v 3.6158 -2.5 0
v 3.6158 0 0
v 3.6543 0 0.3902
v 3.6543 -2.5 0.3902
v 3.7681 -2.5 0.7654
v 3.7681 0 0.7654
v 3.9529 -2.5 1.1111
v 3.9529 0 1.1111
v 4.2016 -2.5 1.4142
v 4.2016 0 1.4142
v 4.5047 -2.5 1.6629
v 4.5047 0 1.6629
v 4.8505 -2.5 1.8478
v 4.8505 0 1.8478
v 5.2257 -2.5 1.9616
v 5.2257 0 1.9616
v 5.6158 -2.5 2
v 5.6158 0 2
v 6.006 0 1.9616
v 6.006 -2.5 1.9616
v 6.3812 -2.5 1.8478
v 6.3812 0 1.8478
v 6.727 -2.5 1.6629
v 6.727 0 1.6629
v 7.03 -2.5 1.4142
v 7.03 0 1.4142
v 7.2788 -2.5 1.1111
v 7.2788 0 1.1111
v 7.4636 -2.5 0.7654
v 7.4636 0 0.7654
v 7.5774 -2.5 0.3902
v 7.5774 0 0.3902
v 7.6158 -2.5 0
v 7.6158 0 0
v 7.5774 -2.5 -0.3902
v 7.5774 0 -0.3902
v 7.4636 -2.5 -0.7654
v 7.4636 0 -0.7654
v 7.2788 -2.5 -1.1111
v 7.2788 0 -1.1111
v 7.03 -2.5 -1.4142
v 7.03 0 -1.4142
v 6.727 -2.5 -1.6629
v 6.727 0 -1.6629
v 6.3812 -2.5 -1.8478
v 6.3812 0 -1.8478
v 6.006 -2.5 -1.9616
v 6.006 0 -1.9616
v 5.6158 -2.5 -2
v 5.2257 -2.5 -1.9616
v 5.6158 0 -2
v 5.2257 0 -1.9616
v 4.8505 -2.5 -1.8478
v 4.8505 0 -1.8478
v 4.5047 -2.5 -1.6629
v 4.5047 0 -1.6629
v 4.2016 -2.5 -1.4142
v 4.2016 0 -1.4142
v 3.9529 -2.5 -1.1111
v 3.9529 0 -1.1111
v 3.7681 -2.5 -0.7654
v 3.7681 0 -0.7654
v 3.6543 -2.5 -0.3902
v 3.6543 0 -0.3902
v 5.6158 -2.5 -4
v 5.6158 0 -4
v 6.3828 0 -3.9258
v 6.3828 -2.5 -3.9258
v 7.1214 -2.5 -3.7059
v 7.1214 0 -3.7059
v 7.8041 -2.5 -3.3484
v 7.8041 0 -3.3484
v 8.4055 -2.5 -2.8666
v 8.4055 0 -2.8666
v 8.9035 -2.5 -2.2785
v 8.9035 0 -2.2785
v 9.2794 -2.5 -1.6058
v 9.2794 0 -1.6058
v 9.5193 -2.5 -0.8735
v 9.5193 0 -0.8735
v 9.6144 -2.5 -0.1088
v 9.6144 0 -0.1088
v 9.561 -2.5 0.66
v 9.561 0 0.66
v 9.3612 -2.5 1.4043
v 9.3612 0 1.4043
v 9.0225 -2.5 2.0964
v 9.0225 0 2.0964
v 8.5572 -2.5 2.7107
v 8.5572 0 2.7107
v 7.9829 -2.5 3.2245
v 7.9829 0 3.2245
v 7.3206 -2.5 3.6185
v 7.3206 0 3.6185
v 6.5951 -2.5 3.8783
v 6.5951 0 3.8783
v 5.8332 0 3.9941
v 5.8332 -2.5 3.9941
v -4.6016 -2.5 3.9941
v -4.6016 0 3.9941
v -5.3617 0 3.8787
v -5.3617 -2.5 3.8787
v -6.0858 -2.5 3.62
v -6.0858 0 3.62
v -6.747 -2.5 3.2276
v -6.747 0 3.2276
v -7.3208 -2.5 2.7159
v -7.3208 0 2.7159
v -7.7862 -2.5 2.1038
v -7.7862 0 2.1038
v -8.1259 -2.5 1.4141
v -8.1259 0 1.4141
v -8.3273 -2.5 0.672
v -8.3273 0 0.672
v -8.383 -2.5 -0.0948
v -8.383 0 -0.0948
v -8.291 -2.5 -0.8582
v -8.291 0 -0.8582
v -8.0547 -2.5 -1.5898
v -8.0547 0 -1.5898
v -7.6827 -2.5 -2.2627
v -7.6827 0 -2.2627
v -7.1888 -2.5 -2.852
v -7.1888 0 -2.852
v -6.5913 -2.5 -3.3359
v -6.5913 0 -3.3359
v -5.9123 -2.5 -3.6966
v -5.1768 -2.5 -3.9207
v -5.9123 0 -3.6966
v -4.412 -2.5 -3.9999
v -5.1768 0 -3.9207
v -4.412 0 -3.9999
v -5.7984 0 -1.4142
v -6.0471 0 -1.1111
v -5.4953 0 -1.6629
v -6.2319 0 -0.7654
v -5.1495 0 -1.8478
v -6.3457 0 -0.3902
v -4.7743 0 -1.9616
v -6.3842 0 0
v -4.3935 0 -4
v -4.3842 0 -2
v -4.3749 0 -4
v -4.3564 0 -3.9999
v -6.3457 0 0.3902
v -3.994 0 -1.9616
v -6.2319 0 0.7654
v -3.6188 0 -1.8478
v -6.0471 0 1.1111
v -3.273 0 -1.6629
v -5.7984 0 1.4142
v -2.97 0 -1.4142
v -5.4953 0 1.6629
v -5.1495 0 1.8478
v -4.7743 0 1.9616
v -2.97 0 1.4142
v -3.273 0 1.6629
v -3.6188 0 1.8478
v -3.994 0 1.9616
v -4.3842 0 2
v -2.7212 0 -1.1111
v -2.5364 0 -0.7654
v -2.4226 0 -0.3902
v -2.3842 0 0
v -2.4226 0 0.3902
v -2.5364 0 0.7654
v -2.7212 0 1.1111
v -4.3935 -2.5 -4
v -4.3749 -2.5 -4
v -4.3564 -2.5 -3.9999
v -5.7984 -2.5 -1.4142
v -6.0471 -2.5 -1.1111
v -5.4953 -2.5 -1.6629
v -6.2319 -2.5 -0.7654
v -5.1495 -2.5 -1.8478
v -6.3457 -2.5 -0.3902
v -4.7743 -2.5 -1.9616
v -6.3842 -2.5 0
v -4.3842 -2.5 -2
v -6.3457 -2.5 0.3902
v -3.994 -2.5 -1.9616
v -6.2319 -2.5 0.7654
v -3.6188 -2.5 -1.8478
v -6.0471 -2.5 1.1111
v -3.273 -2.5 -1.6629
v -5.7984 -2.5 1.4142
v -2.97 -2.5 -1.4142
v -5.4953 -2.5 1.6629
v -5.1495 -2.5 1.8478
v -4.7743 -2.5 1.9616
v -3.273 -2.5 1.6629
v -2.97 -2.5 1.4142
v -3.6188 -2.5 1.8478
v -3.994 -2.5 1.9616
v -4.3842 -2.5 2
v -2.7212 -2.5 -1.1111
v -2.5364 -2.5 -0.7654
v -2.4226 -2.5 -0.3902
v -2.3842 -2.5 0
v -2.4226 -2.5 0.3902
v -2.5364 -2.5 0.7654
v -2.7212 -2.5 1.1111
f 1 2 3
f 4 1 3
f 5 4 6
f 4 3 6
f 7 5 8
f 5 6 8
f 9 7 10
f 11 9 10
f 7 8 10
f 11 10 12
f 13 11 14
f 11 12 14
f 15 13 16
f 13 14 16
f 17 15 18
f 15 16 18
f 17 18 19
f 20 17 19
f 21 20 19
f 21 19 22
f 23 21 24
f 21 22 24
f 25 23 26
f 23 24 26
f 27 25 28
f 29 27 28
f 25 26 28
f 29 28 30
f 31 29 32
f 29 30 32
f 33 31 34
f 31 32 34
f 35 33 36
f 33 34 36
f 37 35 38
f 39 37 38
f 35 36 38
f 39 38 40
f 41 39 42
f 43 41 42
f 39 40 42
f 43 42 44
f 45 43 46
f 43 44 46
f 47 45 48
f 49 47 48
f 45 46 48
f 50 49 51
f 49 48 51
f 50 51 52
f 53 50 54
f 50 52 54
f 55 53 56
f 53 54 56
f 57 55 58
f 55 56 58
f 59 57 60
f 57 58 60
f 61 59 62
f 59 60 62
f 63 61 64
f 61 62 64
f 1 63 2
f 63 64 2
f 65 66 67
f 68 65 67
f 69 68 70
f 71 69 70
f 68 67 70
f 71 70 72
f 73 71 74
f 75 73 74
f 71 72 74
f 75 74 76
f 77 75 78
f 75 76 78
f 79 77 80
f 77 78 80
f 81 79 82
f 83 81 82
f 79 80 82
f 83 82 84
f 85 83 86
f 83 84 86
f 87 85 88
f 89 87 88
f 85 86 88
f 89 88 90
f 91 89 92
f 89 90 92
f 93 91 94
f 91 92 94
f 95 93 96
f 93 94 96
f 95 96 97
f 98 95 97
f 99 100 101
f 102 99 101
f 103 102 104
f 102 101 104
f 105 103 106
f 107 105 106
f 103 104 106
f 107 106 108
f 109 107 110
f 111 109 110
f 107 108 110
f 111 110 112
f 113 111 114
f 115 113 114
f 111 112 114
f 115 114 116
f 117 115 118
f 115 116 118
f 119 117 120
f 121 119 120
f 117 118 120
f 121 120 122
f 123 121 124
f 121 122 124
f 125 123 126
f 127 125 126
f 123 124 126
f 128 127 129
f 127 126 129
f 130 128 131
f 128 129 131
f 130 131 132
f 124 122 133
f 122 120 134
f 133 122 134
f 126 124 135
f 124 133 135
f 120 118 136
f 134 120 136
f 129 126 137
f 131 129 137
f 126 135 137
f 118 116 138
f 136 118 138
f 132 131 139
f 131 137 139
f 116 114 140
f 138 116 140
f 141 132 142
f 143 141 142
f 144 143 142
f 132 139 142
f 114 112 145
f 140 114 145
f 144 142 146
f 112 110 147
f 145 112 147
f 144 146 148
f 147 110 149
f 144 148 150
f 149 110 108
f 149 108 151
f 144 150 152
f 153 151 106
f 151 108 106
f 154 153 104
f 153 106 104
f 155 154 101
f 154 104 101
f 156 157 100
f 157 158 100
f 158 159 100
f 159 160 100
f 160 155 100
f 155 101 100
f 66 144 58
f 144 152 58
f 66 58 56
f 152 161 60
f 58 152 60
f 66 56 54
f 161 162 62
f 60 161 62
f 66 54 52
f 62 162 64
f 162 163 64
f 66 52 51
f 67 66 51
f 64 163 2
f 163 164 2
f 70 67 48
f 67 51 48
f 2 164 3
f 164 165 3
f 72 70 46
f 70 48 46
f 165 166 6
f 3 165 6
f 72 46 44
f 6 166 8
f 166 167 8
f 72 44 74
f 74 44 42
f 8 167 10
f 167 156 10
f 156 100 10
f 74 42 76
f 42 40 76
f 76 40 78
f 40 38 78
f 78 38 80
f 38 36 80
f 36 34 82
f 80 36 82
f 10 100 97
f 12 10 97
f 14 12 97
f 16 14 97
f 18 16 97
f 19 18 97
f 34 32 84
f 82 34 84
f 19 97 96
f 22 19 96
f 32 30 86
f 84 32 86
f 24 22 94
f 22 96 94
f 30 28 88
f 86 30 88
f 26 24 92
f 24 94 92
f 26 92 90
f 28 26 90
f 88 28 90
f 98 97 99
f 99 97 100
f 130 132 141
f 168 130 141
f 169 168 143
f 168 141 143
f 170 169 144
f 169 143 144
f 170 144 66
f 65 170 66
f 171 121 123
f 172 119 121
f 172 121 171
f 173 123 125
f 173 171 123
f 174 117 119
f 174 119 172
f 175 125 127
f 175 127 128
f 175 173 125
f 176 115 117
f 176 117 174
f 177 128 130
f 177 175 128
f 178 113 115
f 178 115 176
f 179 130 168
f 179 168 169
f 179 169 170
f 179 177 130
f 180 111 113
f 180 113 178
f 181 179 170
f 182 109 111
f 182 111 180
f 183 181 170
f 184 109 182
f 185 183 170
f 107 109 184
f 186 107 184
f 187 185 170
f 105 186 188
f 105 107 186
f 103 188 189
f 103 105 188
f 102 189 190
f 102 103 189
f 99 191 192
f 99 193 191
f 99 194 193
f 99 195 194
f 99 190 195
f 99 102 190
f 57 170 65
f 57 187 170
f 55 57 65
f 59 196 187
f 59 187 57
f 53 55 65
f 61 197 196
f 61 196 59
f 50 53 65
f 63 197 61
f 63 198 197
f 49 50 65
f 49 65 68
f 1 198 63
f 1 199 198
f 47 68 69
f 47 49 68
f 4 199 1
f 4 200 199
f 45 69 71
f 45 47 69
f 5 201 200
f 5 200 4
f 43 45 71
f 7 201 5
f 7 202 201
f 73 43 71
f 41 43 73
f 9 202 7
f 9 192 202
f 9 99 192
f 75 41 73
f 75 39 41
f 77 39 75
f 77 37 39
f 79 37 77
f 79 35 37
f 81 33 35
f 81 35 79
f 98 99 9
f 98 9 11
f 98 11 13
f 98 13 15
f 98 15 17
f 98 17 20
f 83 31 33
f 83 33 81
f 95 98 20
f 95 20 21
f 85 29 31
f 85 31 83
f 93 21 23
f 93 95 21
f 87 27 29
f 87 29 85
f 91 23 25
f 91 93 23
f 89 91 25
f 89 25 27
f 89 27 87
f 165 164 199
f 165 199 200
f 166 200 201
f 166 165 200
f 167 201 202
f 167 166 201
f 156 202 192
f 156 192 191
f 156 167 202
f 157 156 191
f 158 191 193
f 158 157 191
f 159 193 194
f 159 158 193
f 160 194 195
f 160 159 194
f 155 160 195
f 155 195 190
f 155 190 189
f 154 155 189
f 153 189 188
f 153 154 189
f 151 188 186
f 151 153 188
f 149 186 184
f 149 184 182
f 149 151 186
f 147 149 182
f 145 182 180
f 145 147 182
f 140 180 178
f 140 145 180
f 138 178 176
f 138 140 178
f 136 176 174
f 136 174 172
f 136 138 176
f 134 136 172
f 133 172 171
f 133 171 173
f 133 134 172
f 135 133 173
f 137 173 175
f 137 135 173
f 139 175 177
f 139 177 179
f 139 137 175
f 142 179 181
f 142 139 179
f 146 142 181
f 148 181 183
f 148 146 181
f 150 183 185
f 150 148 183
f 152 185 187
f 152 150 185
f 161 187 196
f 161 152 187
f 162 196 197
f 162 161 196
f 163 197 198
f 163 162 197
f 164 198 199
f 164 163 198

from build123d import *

# Parameters (mm, degrees)
F0_R     = 2
F1_DEPTH = 2.5


with BuildPart() as f1:
    # F0 (on Front) → F1 (new body)
    with BuildSketch(Plane.XZ):
        with BuildLine():
            Line((5.398431, 3.994088), (-4.166759, 3.994088))
            Line((-4.166759, 3.994088), (-4.601569, 3.994088))
            ThreePointArc((-4.601569, 3.994088), (-8.38304, -0.094824), (-4.41201, -3.999903))
            ThreePointArc((-4.41201, -3.999903), (-4.384203, -4), (-4.356396, -3.999904))
            Line((-4.356396, -3.999904), (5.615797, -4))
            ThreePointArc((5.615797, -4), (9.614357, -0.108762), (5.833241, 3.994088))
            Line((5.833241, 3.994088), (5.398431, 3.994088))
        make_face()
        with Locations((-4.384164, 0)):
            Circle(F0_R, mode=Mode.SUBTRACT)
        with BuildLine():
            ThreePointArc((7.615836, 0), (5.615836, -2), (3.615836, 0))
            ThreePointArc((3.615836, 0), (5.615836, 2), (7.615836, 0))
        make_face(mode=Mode.SUBTRACT)
    extrude(amount=F1_DEPTH)


solid = f1.part
